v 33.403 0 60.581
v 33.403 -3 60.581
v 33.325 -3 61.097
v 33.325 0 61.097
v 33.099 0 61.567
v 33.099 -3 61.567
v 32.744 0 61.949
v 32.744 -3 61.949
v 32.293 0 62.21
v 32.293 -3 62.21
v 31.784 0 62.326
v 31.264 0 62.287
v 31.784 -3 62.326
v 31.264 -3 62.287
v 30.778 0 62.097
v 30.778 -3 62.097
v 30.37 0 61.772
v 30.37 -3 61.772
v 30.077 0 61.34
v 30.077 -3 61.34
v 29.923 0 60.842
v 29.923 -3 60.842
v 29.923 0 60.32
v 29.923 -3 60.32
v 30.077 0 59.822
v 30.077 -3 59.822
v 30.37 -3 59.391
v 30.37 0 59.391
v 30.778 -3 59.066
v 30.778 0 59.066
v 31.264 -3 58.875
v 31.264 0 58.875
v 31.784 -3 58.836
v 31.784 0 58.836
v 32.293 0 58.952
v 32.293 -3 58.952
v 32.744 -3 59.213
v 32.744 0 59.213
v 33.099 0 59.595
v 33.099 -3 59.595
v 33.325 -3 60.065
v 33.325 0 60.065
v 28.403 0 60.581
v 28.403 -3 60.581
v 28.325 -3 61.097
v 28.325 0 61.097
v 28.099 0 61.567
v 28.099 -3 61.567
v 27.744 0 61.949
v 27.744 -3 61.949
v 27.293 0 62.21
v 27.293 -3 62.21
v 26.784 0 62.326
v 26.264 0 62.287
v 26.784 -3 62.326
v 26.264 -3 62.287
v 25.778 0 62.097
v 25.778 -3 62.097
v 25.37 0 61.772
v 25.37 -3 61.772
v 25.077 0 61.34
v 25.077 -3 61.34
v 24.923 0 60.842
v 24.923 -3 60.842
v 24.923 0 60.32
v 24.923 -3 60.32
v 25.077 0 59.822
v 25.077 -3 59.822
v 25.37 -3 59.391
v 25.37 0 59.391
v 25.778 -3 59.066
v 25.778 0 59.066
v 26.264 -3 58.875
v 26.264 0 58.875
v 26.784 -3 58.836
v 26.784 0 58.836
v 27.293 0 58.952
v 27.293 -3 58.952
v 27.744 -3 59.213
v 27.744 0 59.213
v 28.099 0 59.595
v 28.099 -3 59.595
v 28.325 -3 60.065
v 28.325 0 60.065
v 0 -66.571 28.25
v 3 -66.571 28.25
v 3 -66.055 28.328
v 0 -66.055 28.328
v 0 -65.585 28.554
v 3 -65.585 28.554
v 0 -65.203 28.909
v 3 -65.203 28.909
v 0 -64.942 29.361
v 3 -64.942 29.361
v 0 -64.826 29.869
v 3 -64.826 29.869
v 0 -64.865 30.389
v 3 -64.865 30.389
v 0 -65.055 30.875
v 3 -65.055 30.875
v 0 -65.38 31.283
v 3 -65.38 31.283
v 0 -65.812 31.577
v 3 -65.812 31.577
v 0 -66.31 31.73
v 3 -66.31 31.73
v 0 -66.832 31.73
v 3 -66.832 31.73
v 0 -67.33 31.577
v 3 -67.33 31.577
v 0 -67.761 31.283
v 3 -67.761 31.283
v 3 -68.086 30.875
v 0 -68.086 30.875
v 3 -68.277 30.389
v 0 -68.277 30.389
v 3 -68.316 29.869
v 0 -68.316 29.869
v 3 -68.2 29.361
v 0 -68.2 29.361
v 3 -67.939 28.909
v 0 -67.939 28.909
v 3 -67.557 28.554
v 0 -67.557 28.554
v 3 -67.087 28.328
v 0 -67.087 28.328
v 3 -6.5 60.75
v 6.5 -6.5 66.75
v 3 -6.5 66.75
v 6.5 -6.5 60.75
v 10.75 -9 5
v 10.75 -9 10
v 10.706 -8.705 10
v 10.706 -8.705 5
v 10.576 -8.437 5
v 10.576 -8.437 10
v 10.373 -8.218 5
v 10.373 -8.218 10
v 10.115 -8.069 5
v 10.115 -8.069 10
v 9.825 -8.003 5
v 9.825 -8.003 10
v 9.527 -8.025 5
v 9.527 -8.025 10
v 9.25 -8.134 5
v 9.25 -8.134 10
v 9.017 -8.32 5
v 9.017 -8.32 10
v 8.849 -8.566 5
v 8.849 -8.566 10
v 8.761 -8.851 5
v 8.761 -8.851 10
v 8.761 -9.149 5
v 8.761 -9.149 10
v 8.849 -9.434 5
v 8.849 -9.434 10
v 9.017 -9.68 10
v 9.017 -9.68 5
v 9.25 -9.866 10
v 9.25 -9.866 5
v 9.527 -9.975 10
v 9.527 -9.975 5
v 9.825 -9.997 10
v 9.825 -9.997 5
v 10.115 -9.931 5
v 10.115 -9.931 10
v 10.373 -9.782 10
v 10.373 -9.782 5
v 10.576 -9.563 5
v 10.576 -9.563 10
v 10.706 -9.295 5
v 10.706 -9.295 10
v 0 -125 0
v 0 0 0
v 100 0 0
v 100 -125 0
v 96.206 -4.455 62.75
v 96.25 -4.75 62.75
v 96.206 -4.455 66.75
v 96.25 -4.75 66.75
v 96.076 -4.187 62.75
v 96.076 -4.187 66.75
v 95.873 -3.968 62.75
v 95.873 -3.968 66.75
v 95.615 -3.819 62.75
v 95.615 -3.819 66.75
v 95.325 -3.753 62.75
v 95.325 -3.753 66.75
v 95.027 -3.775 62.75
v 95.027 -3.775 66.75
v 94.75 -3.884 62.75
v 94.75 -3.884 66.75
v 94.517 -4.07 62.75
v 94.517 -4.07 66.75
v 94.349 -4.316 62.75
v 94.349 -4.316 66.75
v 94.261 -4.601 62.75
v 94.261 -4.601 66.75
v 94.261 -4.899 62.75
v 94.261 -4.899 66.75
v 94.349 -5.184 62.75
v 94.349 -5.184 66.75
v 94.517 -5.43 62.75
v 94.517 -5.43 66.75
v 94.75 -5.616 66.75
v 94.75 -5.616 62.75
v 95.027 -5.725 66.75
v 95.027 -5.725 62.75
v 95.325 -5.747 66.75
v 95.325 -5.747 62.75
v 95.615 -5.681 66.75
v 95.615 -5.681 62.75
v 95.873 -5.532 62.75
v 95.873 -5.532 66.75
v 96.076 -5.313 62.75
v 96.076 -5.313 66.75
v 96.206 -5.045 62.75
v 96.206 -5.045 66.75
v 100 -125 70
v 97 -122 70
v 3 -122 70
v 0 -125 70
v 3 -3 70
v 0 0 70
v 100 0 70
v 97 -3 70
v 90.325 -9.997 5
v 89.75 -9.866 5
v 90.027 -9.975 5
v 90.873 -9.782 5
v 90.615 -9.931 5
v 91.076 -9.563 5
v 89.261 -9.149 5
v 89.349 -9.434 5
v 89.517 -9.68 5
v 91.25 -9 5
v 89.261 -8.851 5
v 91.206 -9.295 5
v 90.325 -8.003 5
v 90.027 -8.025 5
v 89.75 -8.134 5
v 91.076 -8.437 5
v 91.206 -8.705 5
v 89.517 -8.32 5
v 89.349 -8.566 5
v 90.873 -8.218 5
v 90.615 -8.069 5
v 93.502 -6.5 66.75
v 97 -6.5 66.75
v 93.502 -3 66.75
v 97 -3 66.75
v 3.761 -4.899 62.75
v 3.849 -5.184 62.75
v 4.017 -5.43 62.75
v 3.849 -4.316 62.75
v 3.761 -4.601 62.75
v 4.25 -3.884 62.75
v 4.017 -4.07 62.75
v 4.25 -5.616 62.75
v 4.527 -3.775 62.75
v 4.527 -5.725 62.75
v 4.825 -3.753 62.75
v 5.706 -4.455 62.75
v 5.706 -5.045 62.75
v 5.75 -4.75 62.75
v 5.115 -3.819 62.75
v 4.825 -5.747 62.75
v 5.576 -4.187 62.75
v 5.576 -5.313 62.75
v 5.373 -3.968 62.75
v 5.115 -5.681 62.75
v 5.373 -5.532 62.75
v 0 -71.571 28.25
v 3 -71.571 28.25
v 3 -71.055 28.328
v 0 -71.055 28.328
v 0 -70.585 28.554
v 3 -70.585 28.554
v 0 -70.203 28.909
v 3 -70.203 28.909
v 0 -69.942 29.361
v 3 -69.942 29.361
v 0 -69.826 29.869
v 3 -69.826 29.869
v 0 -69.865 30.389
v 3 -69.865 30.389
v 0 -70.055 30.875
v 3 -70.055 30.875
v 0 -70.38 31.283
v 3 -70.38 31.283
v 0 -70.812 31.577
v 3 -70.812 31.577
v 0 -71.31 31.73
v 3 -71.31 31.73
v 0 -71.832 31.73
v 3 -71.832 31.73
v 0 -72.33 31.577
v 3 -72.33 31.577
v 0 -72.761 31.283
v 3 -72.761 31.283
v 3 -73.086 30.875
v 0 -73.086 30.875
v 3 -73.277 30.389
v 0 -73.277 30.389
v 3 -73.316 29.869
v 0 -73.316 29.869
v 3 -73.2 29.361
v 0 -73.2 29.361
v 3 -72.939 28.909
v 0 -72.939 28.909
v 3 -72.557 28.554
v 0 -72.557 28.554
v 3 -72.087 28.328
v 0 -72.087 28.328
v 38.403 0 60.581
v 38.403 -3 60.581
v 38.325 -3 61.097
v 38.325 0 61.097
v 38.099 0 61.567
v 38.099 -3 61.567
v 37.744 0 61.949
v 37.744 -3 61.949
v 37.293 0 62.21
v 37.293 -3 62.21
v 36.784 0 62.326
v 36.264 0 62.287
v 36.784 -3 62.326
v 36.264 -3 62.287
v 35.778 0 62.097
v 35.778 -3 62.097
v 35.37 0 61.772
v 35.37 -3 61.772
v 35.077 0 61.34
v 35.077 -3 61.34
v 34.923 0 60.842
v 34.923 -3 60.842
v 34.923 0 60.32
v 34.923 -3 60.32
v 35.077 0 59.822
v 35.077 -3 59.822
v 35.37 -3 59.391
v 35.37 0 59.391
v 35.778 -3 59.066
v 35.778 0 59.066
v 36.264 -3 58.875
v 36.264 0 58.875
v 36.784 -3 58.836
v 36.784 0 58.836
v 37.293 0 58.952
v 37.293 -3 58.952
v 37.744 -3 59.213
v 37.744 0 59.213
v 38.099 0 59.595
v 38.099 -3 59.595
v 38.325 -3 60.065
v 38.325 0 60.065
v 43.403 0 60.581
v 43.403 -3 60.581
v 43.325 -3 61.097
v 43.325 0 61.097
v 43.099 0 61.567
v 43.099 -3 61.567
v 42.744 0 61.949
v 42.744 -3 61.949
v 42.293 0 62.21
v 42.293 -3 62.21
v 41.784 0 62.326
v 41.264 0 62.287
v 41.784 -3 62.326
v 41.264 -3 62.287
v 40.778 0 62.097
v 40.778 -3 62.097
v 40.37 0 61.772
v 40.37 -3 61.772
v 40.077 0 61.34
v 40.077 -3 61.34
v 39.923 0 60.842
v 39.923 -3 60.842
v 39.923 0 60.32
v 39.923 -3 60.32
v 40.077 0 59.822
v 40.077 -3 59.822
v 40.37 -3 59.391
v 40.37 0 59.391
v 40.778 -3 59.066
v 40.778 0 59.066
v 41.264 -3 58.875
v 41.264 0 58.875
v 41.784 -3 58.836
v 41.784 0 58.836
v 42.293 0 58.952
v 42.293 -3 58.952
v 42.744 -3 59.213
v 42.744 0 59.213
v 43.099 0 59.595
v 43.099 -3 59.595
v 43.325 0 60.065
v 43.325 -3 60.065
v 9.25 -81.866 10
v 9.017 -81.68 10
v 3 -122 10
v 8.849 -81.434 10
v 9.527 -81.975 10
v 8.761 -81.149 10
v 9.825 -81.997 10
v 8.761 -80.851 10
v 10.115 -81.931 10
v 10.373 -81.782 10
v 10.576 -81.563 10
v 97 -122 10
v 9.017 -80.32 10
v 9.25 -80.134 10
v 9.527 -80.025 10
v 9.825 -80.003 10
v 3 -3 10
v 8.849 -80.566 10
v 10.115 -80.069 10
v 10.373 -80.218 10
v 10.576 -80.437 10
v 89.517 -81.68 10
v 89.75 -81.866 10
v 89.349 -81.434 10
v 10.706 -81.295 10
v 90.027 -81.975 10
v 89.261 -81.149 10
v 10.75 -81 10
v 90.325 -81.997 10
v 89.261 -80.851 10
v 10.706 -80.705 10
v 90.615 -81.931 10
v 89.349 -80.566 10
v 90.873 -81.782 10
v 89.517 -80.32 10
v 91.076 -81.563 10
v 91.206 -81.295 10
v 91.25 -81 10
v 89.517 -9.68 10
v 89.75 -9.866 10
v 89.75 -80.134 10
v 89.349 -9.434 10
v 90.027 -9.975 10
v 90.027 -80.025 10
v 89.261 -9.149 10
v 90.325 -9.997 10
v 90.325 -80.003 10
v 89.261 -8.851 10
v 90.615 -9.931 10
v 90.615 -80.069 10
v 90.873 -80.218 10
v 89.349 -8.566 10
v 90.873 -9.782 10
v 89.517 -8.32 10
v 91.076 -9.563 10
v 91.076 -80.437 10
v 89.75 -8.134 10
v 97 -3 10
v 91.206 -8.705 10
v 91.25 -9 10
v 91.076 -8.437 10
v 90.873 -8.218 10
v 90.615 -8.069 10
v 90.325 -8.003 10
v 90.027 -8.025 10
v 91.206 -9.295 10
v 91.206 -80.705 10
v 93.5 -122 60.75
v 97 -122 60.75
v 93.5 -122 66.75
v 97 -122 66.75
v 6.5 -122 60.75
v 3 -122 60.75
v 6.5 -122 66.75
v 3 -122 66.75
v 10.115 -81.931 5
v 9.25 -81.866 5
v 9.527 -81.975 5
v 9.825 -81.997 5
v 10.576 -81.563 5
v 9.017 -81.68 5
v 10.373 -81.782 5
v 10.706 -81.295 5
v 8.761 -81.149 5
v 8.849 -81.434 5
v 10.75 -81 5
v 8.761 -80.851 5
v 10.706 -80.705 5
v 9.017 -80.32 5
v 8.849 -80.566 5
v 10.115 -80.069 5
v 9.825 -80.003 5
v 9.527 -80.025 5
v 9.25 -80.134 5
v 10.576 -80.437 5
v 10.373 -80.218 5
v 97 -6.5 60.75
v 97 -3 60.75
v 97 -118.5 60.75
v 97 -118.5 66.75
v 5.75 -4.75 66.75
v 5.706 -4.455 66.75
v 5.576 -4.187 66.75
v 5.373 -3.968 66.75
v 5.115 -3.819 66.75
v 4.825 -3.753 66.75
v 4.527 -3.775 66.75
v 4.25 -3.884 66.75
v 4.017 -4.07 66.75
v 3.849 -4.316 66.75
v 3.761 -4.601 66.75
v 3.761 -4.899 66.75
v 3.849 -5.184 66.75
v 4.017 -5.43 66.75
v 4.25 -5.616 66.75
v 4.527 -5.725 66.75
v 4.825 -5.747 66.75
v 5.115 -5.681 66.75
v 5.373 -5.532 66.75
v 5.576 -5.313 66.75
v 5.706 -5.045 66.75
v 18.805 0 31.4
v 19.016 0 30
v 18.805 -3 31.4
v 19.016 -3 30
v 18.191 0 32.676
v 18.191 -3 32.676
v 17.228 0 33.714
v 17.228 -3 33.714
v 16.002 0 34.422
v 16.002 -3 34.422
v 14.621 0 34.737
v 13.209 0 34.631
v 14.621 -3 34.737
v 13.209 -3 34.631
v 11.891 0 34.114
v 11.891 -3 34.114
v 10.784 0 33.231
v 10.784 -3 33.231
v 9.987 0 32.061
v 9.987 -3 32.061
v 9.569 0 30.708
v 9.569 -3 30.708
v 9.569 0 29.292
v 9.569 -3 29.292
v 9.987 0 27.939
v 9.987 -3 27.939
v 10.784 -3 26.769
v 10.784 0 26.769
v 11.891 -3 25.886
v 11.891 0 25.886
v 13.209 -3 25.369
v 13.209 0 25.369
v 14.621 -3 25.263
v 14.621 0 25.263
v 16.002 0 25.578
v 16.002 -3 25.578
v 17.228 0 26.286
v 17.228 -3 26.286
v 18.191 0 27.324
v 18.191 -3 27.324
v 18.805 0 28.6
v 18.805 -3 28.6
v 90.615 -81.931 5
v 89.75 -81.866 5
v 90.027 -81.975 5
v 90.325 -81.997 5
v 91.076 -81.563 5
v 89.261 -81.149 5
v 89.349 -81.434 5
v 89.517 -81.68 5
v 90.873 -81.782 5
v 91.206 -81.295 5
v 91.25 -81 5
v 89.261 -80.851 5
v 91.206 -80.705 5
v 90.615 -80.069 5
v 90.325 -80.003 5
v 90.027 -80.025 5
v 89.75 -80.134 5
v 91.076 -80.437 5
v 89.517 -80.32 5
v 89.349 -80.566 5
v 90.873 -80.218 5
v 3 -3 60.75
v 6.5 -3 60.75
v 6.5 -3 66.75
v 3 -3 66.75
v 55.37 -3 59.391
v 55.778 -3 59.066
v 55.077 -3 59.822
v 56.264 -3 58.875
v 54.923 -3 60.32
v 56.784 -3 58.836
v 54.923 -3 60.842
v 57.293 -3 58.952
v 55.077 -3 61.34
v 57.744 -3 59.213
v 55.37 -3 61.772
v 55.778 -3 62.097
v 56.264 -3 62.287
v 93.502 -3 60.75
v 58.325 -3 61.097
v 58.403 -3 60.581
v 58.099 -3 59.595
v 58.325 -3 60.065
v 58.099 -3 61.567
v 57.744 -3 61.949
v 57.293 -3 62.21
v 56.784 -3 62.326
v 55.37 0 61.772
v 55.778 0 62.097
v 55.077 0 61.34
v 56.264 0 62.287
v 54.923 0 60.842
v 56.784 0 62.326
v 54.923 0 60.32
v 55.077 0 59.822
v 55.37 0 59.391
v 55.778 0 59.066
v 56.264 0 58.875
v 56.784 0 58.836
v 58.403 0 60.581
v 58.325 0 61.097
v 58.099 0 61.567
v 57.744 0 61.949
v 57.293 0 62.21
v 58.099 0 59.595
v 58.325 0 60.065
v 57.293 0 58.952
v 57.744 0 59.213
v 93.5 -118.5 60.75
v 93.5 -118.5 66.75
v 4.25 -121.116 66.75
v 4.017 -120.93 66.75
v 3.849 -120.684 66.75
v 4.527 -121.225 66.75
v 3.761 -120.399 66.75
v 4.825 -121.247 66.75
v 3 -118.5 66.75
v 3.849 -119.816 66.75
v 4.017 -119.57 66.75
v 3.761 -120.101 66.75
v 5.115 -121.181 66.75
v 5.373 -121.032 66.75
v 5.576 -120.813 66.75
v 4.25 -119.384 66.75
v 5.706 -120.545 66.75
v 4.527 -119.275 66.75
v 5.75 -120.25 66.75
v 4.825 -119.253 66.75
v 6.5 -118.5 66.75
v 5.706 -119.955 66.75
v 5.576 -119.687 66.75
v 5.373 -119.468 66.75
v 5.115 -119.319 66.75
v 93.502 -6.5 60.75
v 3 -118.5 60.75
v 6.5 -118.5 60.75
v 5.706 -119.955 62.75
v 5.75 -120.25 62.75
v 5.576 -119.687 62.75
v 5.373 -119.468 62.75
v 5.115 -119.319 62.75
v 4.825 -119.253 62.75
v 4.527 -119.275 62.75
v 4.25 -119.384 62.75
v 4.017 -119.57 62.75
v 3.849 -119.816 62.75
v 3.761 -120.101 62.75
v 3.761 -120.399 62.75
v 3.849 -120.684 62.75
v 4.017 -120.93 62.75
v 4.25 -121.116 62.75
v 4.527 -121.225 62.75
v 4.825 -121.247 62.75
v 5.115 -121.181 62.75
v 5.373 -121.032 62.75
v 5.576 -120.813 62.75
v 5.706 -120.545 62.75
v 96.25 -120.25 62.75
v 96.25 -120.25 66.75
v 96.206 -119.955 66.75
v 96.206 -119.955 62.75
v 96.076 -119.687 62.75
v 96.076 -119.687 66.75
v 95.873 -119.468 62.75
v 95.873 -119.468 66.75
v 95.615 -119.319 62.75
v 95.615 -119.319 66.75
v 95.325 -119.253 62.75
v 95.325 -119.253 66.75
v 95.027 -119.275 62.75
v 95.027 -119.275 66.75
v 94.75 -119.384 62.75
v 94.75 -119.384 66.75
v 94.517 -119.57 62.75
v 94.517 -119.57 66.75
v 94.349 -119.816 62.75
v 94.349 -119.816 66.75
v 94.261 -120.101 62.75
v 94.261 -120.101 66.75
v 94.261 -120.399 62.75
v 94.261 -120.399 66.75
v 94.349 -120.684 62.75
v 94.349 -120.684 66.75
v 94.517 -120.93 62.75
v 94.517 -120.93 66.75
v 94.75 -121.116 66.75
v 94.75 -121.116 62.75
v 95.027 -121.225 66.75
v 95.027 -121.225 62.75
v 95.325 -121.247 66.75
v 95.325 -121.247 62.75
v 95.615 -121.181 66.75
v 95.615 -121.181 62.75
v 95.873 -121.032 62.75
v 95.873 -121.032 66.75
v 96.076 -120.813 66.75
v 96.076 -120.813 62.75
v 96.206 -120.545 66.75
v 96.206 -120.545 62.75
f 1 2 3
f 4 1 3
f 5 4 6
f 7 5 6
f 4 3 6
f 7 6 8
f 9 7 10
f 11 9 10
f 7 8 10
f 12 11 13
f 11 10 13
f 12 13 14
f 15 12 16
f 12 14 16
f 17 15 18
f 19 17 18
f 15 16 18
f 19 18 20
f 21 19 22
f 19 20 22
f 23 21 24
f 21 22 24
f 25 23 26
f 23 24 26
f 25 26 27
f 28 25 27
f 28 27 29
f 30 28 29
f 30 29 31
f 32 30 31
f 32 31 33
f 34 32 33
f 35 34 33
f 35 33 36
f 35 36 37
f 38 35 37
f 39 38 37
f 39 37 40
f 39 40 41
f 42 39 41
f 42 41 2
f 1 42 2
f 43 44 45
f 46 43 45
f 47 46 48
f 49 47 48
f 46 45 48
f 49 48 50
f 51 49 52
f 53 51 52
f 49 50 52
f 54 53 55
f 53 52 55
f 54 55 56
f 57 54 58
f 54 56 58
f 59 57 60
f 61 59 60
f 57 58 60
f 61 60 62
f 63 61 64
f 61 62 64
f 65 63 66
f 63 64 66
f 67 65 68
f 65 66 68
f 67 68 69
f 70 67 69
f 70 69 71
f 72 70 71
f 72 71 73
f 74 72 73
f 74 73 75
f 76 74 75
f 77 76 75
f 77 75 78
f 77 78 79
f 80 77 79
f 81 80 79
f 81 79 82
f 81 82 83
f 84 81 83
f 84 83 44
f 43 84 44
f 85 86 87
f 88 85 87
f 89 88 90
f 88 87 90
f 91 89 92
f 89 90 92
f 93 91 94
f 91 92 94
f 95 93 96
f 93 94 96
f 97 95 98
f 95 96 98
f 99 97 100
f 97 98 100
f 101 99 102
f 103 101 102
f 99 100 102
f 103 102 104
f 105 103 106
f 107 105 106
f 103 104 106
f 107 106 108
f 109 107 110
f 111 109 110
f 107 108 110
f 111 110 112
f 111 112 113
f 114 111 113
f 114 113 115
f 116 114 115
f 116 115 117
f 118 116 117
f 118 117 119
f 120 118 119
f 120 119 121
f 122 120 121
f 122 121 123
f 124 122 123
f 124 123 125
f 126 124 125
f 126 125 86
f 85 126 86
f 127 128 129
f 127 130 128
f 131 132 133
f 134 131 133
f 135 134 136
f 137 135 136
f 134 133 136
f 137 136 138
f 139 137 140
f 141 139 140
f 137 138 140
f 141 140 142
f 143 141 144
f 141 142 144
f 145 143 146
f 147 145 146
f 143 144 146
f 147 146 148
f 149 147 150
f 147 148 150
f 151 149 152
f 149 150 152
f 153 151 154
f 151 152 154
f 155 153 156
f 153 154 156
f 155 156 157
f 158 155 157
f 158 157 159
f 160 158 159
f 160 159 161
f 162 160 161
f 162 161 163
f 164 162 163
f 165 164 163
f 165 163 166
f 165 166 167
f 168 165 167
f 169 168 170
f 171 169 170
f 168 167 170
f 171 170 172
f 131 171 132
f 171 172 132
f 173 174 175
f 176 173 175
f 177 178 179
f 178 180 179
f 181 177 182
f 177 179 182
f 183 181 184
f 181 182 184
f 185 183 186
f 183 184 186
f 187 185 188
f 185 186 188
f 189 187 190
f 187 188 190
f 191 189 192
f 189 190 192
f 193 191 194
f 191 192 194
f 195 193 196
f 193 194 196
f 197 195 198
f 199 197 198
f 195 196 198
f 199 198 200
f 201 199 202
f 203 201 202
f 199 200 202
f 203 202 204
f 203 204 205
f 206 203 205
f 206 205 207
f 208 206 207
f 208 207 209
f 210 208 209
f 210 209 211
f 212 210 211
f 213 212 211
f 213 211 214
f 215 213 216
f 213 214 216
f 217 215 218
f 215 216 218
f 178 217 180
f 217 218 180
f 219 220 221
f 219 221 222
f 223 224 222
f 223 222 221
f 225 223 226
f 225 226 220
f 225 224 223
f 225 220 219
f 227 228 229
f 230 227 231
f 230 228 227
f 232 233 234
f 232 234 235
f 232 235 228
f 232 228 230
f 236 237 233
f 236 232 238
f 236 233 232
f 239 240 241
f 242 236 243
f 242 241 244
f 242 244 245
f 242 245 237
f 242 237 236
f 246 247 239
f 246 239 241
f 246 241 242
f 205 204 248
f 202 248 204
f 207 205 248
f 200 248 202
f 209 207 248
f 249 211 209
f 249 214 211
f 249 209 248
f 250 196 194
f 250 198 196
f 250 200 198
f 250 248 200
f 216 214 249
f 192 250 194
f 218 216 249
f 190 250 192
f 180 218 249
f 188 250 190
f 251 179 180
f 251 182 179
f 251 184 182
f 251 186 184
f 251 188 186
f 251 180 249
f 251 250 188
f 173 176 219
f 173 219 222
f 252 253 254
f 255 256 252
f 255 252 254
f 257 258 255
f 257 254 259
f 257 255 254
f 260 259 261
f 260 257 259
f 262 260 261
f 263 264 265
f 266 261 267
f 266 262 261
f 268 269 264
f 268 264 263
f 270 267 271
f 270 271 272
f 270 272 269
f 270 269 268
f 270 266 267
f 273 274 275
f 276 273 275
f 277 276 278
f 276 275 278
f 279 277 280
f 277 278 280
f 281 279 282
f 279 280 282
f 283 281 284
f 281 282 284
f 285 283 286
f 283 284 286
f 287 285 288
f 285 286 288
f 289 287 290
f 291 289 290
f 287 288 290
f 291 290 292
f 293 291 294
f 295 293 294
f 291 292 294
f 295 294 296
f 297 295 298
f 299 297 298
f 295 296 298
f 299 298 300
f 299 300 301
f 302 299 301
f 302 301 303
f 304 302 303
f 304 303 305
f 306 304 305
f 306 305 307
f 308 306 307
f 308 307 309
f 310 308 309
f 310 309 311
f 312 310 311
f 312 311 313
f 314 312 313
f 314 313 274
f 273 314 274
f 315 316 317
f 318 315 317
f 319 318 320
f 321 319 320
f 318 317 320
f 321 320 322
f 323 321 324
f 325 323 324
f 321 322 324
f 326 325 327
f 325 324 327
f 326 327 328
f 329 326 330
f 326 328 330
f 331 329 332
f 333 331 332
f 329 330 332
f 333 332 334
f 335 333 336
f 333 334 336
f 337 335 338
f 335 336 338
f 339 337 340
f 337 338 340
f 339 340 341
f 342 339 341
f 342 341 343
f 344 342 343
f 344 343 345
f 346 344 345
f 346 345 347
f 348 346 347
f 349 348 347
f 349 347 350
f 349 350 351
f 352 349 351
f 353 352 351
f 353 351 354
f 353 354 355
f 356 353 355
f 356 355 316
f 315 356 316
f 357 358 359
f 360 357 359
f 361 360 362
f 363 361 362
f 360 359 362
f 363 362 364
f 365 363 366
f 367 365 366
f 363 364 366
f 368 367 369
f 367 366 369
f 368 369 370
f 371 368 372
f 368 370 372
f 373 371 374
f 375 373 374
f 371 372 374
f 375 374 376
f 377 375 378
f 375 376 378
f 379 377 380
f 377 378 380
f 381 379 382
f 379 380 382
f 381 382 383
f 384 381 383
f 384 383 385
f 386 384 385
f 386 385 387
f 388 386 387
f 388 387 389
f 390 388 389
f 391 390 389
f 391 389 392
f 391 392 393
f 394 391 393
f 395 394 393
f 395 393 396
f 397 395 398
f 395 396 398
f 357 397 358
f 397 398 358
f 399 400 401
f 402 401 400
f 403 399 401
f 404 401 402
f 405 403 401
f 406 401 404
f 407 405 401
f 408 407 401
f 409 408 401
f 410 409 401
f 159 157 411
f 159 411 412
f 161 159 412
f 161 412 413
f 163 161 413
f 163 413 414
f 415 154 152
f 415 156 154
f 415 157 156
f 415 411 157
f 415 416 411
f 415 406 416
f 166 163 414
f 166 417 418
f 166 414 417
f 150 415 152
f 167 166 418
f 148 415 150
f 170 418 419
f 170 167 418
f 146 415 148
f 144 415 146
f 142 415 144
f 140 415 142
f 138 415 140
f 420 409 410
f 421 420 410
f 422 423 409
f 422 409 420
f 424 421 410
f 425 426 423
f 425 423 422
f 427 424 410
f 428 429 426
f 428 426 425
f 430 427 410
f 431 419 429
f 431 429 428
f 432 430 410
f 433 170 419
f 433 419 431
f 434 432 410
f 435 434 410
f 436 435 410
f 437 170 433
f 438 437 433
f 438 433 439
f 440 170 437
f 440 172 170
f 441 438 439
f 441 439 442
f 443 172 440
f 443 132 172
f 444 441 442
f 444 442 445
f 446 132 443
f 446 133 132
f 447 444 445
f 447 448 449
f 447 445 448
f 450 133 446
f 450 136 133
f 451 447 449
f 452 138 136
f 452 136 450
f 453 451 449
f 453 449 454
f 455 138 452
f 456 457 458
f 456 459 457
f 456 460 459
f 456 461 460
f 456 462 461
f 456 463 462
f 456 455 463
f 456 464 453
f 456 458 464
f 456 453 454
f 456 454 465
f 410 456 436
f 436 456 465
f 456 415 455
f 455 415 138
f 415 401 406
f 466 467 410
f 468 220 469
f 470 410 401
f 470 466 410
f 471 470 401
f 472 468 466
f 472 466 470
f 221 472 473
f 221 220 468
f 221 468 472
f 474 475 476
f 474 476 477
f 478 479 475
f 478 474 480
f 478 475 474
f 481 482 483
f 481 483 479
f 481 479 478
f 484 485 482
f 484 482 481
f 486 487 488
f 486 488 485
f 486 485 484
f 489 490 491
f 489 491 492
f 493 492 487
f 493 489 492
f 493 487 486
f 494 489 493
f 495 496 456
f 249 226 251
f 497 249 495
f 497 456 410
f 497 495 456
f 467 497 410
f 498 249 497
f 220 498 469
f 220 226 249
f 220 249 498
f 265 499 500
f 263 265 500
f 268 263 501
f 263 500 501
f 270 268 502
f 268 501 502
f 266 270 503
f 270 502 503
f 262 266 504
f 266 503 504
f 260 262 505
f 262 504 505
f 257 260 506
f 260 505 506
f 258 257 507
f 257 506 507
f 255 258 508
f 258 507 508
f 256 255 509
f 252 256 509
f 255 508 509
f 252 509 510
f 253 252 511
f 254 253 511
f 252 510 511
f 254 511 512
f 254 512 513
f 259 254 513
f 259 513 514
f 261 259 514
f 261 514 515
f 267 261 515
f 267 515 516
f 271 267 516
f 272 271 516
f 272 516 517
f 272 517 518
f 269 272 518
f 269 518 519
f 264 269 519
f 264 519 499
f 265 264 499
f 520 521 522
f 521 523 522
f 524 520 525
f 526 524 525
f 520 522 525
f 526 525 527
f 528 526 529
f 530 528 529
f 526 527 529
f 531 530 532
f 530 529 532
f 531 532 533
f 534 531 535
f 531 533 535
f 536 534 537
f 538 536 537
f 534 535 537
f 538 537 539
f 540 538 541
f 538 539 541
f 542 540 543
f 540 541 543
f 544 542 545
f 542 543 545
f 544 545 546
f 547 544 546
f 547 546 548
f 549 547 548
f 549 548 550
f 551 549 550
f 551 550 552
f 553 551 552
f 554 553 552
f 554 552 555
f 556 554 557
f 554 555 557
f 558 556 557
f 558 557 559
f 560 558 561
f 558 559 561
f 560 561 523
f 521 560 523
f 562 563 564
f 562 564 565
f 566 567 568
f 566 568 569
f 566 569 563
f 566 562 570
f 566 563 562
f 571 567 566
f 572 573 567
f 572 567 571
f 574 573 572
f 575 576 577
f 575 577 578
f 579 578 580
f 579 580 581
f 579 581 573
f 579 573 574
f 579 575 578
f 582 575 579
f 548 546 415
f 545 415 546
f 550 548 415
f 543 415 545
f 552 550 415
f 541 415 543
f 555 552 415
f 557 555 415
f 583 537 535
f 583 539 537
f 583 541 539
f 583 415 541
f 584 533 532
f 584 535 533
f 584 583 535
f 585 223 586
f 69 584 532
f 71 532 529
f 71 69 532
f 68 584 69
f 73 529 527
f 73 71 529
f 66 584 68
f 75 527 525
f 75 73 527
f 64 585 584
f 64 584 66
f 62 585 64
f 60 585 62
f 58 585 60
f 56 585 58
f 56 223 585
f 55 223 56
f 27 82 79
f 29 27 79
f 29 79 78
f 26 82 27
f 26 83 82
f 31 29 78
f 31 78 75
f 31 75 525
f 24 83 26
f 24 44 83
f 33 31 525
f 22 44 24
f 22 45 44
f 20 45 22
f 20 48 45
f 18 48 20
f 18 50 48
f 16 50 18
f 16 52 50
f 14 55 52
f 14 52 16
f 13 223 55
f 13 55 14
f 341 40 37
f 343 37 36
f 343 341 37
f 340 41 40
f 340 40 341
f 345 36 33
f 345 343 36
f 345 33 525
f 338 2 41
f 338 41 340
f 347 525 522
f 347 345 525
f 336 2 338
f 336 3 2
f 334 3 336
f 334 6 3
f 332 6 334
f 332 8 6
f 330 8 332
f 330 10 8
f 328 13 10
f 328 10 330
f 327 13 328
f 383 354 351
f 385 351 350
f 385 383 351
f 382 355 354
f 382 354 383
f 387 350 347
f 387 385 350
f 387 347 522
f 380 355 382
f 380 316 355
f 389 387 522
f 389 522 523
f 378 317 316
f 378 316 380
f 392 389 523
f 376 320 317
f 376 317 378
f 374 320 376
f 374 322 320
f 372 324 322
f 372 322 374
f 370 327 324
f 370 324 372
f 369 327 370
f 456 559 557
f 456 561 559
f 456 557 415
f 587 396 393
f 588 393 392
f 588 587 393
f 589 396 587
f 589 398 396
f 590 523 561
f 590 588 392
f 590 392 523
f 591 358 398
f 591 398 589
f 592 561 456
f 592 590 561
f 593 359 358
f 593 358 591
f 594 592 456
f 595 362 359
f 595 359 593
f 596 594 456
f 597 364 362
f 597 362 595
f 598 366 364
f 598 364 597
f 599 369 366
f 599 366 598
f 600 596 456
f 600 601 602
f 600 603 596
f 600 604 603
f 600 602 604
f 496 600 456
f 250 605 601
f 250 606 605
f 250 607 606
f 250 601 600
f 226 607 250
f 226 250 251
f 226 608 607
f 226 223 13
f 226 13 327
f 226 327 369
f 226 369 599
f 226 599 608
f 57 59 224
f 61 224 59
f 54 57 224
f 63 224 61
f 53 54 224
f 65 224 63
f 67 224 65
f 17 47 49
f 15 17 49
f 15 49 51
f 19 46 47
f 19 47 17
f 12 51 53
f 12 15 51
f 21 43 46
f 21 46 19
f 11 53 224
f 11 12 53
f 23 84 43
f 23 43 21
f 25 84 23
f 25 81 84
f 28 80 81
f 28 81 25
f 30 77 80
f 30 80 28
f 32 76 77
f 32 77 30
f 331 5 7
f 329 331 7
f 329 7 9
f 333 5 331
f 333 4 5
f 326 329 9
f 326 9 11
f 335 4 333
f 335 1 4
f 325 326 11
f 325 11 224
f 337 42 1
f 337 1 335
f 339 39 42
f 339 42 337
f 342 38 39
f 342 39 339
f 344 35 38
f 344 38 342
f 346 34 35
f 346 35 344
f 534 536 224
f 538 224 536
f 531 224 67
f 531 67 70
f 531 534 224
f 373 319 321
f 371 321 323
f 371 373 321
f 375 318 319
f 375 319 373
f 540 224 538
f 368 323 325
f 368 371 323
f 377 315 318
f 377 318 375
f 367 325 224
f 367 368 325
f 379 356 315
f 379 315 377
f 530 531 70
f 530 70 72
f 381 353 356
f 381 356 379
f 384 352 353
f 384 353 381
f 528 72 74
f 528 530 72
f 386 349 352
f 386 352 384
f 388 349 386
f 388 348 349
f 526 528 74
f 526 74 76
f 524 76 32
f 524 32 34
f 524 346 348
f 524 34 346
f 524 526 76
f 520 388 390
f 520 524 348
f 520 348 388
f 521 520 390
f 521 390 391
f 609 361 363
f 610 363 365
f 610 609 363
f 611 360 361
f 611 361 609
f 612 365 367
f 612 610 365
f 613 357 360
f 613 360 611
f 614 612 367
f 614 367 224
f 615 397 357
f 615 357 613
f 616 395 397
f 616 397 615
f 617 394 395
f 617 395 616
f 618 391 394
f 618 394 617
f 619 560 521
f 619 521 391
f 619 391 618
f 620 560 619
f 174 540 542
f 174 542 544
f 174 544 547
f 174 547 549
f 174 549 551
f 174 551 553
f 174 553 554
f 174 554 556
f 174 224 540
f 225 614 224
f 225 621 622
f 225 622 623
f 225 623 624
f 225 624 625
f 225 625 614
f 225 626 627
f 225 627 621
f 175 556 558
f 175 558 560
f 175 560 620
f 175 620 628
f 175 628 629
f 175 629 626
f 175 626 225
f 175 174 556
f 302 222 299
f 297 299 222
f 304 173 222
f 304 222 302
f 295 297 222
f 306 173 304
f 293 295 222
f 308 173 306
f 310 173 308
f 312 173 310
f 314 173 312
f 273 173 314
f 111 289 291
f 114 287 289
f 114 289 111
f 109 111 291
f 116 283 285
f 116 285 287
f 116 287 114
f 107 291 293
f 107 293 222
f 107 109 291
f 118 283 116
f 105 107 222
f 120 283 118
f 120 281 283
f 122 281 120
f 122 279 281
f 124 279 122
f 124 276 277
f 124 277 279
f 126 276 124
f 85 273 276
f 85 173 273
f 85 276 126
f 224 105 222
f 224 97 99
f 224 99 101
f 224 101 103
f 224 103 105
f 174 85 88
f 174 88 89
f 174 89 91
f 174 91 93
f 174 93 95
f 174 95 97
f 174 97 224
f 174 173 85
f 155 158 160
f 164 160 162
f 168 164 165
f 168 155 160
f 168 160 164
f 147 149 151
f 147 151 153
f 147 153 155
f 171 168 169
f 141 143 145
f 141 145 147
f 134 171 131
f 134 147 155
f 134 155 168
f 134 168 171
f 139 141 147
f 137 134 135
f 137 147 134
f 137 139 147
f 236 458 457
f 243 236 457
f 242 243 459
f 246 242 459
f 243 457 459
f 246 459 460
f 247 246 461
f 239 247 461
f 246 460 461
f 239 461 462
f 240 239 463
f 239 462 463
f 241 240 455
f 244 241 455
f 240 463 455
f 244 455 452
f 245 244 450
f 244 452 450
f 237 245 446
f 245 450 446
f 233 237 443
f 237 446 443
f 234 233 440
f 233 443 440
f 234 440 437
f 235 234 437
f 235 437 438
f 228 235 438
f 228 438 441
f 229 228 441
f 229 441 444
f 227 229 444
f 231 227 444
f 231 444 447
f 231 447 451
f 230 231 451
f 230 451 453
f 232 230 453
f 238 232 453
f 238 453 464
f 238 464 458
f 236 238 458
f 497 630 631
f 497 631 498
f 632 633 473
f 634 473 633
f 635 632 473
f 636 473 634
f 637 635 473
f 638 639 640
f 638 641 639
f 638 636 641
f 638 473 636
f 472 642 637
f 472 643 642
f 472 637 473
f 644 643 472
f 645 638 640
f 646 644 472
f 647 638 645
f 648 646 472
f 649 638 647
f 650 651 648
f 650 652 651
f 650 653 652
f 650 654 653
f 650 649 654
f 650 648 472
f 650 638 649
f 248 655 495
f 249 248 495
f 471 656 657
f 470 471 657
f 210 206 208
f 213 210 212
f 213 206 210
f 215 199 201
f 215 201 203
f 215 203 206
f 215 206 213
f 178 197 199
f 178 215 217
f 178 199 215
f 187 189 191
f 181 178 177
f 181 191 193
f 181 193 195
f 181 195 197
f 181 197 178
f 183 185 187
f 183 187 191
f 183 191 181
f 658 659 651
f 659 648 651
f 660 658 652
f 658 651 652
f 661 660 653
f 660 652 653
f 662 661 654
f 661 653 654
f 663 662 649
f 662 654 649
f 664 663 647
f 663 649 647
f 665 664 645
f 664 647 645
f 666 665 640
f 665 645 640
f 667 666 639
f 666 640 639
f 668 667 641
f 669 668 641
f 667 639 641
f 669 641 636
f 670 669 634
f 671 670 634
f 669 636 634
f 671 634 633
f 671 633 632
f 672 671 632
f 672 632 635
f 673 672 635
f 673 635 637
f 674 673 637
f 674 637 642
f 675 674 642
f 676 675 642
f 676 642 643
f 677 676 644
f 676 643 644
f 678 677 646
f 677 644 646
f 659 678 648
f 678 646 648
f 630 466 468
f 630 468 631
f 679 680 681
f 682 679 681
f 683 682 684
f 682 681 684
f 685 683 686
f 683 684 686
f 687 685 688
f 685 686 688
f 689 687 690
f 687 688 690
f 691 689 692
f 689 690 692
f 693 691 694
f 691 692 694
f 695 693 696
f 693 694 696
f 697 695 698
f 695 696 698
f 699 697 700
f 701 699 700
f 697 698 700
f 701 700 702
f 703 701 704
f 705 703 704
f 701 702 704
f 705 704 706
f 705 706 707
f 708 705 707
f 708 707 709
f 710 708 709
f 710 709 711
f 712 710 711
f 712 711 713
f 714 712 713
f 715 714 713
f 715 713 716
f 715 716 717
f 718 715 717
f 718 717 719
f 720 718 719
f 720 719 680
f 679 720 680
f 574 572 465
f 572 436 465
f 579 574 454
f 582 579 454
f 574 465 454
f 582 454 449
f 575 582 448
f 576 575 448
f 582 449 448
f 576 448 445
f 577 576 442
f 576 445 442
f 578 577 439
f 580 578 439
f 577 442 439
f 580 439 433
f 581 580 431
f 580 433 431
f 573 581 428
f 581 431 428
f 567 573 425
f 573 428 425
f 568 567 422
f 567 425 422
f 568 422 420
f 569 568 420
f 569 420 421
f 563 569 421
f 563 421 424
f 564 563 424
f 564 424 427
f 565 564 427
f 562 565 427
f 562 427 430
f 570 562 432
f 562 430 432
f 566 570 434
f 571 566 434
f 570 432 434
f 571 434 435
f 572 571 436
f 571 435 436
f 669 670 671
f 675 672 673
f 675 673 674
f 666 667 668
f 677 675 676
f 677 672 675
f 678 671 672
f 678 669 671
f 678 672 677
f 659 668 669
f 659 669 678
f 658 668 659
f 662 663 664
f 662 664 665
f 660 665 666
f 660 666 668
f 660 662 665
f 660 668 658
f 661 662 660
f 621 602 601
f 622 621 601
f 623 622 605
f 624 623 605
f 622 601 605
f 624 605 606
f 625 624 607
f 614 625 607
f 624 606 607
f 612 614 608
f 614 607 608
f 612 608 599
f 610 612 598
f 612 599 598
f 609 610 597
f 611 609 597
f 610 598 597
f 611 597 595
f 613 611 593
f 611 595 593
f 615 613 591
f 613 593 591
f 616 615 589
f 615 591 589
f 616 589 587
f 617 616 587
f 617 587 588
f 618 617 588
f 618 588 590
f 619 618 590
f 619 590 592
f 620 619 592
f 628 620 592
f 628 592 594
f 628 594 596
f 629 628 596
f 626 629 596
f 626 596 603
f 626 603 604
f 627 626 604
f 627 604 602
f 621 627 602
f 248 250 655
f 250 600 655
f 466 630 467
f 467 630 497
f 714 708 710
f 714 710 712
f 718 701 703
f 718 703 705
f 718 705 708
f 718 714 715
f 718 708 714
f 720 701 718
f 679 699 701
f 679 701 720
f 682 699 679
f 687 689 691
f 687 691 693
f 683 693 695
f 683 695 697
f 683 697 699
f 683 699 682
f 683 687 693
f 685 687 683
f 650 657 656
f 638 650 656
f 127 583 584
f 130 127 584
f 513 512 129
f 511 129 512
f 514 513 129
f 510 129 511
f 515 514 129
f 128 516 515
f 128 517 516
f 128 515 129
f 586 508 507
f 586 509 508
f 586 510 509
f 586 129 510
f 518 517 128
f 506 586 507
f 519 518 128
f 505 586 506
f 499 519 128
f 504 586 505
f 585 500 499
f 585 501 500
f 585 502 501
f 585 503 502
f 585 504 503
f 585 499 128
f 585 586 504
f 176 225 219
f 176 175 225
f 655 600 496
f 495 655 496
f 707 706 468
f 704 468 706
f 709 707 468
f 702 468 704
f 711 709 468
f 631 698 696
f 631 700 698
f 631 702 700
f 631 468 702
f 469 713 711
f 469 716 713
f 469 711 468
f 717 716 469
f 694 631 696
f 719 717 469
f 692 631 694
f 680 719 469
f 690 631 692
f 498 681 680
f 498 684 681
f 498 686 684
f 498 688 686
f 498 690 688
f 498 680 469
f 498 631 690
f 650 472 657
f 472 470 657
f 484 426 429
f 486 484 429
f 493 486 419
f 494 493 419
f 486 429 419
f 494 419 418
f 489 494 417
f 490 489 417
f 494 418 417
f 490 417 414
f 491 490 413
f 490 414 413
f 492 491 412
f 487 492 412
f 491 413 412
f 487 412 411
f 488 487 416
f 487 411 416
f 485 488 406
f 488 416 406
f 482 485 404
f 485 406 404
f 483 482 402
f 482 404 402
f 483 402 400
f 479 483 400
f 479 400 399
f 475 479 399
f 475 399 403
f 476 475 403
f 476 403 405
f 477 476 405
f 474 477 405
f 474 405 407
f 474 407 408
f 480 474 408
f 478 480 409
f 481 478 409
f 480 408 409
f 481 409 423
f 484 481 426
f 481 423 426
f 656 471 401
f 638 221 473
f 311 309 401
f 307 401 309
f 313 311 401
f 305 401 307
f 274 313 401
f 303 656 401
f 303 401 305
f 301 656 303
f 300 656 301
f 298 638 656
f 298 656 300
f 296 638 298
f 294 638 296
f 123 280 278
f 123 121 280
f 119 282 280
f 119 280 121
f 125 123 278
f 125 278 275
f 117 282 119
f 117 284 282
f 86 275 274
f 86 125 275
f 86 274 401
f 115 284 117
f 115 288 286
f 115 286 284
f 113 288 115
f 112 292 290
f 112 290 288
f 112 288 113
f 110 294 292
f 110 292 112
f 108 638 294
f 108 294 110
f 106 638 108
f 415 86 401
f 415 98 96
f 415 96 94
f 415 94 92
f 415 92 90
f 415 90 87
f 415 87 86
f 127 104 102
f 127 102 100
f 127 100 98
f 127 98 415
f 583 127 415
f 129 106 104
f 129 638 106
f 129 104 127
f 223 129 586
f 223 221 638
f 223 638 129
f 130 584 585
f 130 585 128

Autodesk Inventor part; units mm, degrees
ref_plane "YZ Plane" through (0, 0, 0) normal (1, 0, 0) x (0, 1, 0)
ref_plane "XZ Plane" through (0, 0, 0) normal (0, 1, 0) x (-1, 0, 0)
sketch "Boceto3" plane through (0, 0, 0) normal (0, 0, 1) x (1, 0, 0)
  line L0 (0, 0) -> (100, 0)
  line L1 (100, 0) -> (100, -125)
  line L2 (100, -125) -> (0, -125)
  line L3 (0, -125) -> (0, 0)
  dimension "d8" = 100
  dimension "d9" = 125
extrude "Extrusión2" add sketch "Boceto3" along normal blind 70
sketch "Boceto4" plane through (0, 0, 70) normal (0, 0, 1) x (1, 0, 0)
  line L0 (0, 0) -> (50, 0)
  line L1 (100, 0) -> (0, 0) projected
  line L2 (0, 0) -> (0, -125) projected
  line L3 (0, 0) -> (0, -45)
  line L4 (6.25, -5.5) -> (93.75, -5.5)
  line L5 (93.75, -5.5) -> (93.75, -84.5)
  line L6 (93.75, -84.5) -> (6.25, -84.5)
  line L7 (6.25, -84.5) -> (6.25, -5.5)
  line L8 (6.25, -5.5) -> (93.75, -84.5) construction
  line L9 (93.75, -5.5) -> (6.25, -84.5) construction
  line L10 (6.25, -5.5) -> (9.75, -5.5)
  line L11 (6.25, -5.5) -> (6.25, -9)
  circle A0 centre (9.75, -9) radius 1
  line L12 (93.75, -5.5) -> (90.25, -5.5)
  line L13 (93.75, -5.5) -> (93.75, -9)
  circle A1 centre (90.25, -9) radius 1
  line L14 (93.75, -84.5) -> (90.25, -84.5)
  line L15 (93.75, -84.5) -> (93.75, -81)
  circle A2 centre (90.25, -81) radius 1
  line L16 (6.25, -84.5) -> (9.75, -84.5)
  line L17 (6.25, -84.5) -> (6.25, -81)
  circle A3 centre (9.75, -81) radius 1
  point P0 (50, -45)
  dimension "d12" = 45
  dimension "d13" = 87.5
  dimension "d14" = 79
  dimension "d22" = 3.5
  dimension "d23" = 3.5
  dimension "d24" = 2
  dimension "d25" = 3.5
  dimension "d26" = 3.5
  dimension "d27" = 2
  dimension "d28" = 3.5
  dimension "d29" = 3.5
  dimension "d30" = 2
  dimension "d31" = 3.5
  dimension "d32" = 3.5
  dimension "d33" = 2
sketch "Boceto5" plane through (0, 0, 70) normal (0, 0, 1) x (1, 0, 0)
  line L0 (100, 0) -> (0, 0) projected
  line L1 (0, 0) -> (0, -62.5)
  line L2 (0, 0) -> (0, -125) projected
  line L3 (0, 0) -> (3, 0)
  line L4 (0, 0) -> (0, -3)
  line L5 (100, -125) -> (100, 0) projected
  line L6 (100, -125) -> (100, -122)
  line L7 (0, -125) -> (100, -125) projected
  line L8 (100, -125) -> (97, -125)
  line L9 (97, -122) -> (3, -122)
  line L10 (3, -122) -> (3, -3)
  line L11 (3, -3) -> (97, -3)
  line L12 (97, -3) -> (97, -122)
  dimension "d15" = 62.5
  dimension "d16" = 3
  dimension "d17" = 3
  dimension "d18" = 3
  dimension "d19" = 3
extrude "Extrusión3" cut sketch "Boceto5" against normal blind 60 contours L9 L10 L11 L12
extrude "Extrusión4" cut sketch "Boceto4" against normal blind 65 contours A0 | A1 | A2 | A3
sketch "Boceto7" plane through (0, 0, 70) normal (0, 0, 1) x (1, 0, 0)
  point P0 (0, 0)
sketch "Boceto8" plane through (0, 0, 70) normal (0, 0, 1) x (1, 0, 0)
  point P0 (0, 0)
ref_plane "Plano de trabajo1" through (0, 0, 60.75) normal (0, 0, 1) x (1, 0, 0)
sketch "Boceto9" plane through (0, 0, 60.75) normal (0, 0, 1) x (1, 0, 0)
  line L0 (3, -3) -> (6.5, -3)
  line L1 (6.5, -3) -> (6.5, -6.5)
  line L2 (6.5, -6.5) -> (3, -6.5)
  line L3 (3, -6.5) -> (3, -3)
  line L4 (97.0016, -3) -> (93.5016, -3)
  line L5 (93.5016, -3) -> (93.5016, -6.5)
  line L6 (93.5016, -6.5) -> (97.0016, -6.5)
  line L7 (97.0016, -6.5) -> (97.0016, -3)
  line L8 (3, -122) -> (3, -3) projected
  line L9 (3, -122) -> (6.5, -122)
  line L10 (6.5, -122) -> (6.5, -118.5)
  line L11 (6.5, -118.5) -> (3, -118.5)
  line L12 (3, -118.5) -> (3, -122)
  line L13 (97, -3) -> (97, -122) projected
  line L14 (97, -122) -> (93.5, -122)
  line L15 (93.5, -122) -> (93.5, -118.5)
  line L16 (93.5, -118.5) -> (97, -118.5)
  line L17 (97, -118.5) -> (97, -122)
  point P0 (0, 0)
  point P1 (97, -6.5)
  dimension "d61" = 3.5
  dimension "d62" = 3.5
  dimension "d63" = 3.5
  dimension "d64" = 3.5
  dimension "d65" = 3.5
  dimension "d66" = 3.5
  dimension "d70" = 3.5
  dimension "d71" = 3.5
ref_plane "Plano de trabajo2" through (0, 0, 60.25) normal (0, 0, 1) x (1, 0, 0)
sketch "Boceto10" plane through (3, -122, 70) normal (0, 1, 0) x (1, 0, 0)
  point P0 (-3, 70)
sketch "Boceto11" plane through (0, 0, 10) normal (0, 0, 1) x (1, 0, 0)
  line L0 (-58.2651, -184.2292) -> (-60.7624, -188.5609)
  point P0 (0, 0)
  dimension "d68" = 5
sketch "Boceto12" plane through (0, 0, 60.75) normal (0, 0, 1) x (1, 0, 0)
  point P0 (0, 0)
extrude "Extrusión6" add sketch "Boceto9" along normal blind 6
sketch "Boceto13" plane through (0, 0, 66.75) normal (0, 0, 1) x (1, 0, 0)
  point P0 (0, 0)
sketch "Boceto14" plane through (0, 0, 66.75) normal (0, 0, 1) x (1, 0, 0)
  line L0 (6.5, -122) -> (6.5, -118.5) projected
  line L1 (6.5, -118.5) -> (4.75, -118.5)
  line L2 (6.5, -118.5) -> (3, -118.5) projected
  line L3 (6.5, -118.5) -> (6.5, -120.25)
  circle A0 centre (4.75, -120.25) radius 1
  line L4 (93.5, -118.5) -> (93.5, -122) projected
  line L5 (93.5, -118.5) -> (95.25, -118.5)
  line L6 (97, -118.5) -> (93.5, -118.5) projected
  line L7 (93.5, -118.5) -> (93.5, -120.25)
  circle A1 centre (95.25, -120.25) radius 1
  line L8 (3, -3) -> (97, -3) projected
  line L9 (97, -3) -> (95.25, -3)
  line L10 (97, -3) -> (97, -4.75)
  line L11 (97, -3) -> (97, -122) projected
  circle A2 centre (95.25, -4.75) radius 1
  line L12 (3, -122) -> (3, -3) projected
  line L13 (3, -3) -> (4.75, -3)
  line L14 (3, -3) -> (3, -4.75)
  circle A3 centre (4.75, -4.75) radius 1
  point P0 (0, 0)
  dimension "d74" = 1.75
  dimension "d75" = 1.75
  dimension "d76" = 2
  dimension "d77" = 1.75
  dimension "d78" = 1.75
  dimension "d79" = 2
  dimension "d80" = 1.75
  dimension "d81" = 1.75
  dimension "d82" = 2
  dimension "d83" = 1.75
  dimension "d84" = 1.75
  dimension "d85" = 2
extrude "Extrusión7" cut sketch "Boceto14" against normal blind 4
sketch "Boceto15" plane through (0, 0, 66.75) normal (0, 0, 1) x (1, 0, 0)
  point P0 (0, 0)
sketch "Boceto16" plane through (3, -122, 70) normal (1, 0, 0) x (0, 0, -1)
  line L0 (60, 0) -> (60, 119) projected
  line L1 (60, 50.4292) -> (40, 50.4292)
  line L2 (60, 50.4292) -> (80, 50.4292) construction
  circle A0 centre (40, 50.4292) radius 1.75
  line L3 (40, 50.4292) -> (40, 55.4292)
  circle A1 centre (40, 55.4292) radius 1.75
  point P0 (70, 122)
  dimension "d88" = 20
  dimension "d89" = 180
  dimension "d90" = 3.5
  dimension "d91" = 5
  dimension "d92" = 3.5
extrude "Extrusión8" cut sketch "Boceto16" against normal blind 10
sketch "Boceto17" plane through (3, -3, 70) normal (0, -1, 0) x (1, 0, 0)
  line L0 (0, -60) -> (94, -60) projected
  line L1 (23.6532, -59.4188) -> (73.6532, -59.4188) construction
  circle A0 centre (23.6532, -9.4188) radius 1.75
  circle A1 centre (28.6532, -9.4188) radius 1.75
  circle A2 centre (33.6532, -9.4188) radius 1.75
  circle A3 centre (38.6532, -9.4188) radius 1.75
  circle A4 centre (53.6532, -9.4188) radius 1.75
  point P0 (-3, -70)
  dimension "d97" = 3.5
  dimension "d99" = 3.5
  dimension "d101" = 3.5
  dimension "d103" = 3.5
  dimension "d109" = 3.5
extrude "Extrusión9" cut sketch "Boceto17" against normal blind 10
sketch "Boceto18" plane through (3, -3, 70) normal (0, -1, 0) x (1, 0, 0)
  line L0 (0, -60) -> (94, -60) projected
  line L1 (11.2664, -60) -> (31.2664, -60) construction
  circle A0 centre (11.2664, -40) radius 4.75
  point P0 (-3, -70)
  dimension "d114" = 9.5
extrude "Extrusión10" cut sketch "Boceto18" against normal blind 10
properties part number "base"
